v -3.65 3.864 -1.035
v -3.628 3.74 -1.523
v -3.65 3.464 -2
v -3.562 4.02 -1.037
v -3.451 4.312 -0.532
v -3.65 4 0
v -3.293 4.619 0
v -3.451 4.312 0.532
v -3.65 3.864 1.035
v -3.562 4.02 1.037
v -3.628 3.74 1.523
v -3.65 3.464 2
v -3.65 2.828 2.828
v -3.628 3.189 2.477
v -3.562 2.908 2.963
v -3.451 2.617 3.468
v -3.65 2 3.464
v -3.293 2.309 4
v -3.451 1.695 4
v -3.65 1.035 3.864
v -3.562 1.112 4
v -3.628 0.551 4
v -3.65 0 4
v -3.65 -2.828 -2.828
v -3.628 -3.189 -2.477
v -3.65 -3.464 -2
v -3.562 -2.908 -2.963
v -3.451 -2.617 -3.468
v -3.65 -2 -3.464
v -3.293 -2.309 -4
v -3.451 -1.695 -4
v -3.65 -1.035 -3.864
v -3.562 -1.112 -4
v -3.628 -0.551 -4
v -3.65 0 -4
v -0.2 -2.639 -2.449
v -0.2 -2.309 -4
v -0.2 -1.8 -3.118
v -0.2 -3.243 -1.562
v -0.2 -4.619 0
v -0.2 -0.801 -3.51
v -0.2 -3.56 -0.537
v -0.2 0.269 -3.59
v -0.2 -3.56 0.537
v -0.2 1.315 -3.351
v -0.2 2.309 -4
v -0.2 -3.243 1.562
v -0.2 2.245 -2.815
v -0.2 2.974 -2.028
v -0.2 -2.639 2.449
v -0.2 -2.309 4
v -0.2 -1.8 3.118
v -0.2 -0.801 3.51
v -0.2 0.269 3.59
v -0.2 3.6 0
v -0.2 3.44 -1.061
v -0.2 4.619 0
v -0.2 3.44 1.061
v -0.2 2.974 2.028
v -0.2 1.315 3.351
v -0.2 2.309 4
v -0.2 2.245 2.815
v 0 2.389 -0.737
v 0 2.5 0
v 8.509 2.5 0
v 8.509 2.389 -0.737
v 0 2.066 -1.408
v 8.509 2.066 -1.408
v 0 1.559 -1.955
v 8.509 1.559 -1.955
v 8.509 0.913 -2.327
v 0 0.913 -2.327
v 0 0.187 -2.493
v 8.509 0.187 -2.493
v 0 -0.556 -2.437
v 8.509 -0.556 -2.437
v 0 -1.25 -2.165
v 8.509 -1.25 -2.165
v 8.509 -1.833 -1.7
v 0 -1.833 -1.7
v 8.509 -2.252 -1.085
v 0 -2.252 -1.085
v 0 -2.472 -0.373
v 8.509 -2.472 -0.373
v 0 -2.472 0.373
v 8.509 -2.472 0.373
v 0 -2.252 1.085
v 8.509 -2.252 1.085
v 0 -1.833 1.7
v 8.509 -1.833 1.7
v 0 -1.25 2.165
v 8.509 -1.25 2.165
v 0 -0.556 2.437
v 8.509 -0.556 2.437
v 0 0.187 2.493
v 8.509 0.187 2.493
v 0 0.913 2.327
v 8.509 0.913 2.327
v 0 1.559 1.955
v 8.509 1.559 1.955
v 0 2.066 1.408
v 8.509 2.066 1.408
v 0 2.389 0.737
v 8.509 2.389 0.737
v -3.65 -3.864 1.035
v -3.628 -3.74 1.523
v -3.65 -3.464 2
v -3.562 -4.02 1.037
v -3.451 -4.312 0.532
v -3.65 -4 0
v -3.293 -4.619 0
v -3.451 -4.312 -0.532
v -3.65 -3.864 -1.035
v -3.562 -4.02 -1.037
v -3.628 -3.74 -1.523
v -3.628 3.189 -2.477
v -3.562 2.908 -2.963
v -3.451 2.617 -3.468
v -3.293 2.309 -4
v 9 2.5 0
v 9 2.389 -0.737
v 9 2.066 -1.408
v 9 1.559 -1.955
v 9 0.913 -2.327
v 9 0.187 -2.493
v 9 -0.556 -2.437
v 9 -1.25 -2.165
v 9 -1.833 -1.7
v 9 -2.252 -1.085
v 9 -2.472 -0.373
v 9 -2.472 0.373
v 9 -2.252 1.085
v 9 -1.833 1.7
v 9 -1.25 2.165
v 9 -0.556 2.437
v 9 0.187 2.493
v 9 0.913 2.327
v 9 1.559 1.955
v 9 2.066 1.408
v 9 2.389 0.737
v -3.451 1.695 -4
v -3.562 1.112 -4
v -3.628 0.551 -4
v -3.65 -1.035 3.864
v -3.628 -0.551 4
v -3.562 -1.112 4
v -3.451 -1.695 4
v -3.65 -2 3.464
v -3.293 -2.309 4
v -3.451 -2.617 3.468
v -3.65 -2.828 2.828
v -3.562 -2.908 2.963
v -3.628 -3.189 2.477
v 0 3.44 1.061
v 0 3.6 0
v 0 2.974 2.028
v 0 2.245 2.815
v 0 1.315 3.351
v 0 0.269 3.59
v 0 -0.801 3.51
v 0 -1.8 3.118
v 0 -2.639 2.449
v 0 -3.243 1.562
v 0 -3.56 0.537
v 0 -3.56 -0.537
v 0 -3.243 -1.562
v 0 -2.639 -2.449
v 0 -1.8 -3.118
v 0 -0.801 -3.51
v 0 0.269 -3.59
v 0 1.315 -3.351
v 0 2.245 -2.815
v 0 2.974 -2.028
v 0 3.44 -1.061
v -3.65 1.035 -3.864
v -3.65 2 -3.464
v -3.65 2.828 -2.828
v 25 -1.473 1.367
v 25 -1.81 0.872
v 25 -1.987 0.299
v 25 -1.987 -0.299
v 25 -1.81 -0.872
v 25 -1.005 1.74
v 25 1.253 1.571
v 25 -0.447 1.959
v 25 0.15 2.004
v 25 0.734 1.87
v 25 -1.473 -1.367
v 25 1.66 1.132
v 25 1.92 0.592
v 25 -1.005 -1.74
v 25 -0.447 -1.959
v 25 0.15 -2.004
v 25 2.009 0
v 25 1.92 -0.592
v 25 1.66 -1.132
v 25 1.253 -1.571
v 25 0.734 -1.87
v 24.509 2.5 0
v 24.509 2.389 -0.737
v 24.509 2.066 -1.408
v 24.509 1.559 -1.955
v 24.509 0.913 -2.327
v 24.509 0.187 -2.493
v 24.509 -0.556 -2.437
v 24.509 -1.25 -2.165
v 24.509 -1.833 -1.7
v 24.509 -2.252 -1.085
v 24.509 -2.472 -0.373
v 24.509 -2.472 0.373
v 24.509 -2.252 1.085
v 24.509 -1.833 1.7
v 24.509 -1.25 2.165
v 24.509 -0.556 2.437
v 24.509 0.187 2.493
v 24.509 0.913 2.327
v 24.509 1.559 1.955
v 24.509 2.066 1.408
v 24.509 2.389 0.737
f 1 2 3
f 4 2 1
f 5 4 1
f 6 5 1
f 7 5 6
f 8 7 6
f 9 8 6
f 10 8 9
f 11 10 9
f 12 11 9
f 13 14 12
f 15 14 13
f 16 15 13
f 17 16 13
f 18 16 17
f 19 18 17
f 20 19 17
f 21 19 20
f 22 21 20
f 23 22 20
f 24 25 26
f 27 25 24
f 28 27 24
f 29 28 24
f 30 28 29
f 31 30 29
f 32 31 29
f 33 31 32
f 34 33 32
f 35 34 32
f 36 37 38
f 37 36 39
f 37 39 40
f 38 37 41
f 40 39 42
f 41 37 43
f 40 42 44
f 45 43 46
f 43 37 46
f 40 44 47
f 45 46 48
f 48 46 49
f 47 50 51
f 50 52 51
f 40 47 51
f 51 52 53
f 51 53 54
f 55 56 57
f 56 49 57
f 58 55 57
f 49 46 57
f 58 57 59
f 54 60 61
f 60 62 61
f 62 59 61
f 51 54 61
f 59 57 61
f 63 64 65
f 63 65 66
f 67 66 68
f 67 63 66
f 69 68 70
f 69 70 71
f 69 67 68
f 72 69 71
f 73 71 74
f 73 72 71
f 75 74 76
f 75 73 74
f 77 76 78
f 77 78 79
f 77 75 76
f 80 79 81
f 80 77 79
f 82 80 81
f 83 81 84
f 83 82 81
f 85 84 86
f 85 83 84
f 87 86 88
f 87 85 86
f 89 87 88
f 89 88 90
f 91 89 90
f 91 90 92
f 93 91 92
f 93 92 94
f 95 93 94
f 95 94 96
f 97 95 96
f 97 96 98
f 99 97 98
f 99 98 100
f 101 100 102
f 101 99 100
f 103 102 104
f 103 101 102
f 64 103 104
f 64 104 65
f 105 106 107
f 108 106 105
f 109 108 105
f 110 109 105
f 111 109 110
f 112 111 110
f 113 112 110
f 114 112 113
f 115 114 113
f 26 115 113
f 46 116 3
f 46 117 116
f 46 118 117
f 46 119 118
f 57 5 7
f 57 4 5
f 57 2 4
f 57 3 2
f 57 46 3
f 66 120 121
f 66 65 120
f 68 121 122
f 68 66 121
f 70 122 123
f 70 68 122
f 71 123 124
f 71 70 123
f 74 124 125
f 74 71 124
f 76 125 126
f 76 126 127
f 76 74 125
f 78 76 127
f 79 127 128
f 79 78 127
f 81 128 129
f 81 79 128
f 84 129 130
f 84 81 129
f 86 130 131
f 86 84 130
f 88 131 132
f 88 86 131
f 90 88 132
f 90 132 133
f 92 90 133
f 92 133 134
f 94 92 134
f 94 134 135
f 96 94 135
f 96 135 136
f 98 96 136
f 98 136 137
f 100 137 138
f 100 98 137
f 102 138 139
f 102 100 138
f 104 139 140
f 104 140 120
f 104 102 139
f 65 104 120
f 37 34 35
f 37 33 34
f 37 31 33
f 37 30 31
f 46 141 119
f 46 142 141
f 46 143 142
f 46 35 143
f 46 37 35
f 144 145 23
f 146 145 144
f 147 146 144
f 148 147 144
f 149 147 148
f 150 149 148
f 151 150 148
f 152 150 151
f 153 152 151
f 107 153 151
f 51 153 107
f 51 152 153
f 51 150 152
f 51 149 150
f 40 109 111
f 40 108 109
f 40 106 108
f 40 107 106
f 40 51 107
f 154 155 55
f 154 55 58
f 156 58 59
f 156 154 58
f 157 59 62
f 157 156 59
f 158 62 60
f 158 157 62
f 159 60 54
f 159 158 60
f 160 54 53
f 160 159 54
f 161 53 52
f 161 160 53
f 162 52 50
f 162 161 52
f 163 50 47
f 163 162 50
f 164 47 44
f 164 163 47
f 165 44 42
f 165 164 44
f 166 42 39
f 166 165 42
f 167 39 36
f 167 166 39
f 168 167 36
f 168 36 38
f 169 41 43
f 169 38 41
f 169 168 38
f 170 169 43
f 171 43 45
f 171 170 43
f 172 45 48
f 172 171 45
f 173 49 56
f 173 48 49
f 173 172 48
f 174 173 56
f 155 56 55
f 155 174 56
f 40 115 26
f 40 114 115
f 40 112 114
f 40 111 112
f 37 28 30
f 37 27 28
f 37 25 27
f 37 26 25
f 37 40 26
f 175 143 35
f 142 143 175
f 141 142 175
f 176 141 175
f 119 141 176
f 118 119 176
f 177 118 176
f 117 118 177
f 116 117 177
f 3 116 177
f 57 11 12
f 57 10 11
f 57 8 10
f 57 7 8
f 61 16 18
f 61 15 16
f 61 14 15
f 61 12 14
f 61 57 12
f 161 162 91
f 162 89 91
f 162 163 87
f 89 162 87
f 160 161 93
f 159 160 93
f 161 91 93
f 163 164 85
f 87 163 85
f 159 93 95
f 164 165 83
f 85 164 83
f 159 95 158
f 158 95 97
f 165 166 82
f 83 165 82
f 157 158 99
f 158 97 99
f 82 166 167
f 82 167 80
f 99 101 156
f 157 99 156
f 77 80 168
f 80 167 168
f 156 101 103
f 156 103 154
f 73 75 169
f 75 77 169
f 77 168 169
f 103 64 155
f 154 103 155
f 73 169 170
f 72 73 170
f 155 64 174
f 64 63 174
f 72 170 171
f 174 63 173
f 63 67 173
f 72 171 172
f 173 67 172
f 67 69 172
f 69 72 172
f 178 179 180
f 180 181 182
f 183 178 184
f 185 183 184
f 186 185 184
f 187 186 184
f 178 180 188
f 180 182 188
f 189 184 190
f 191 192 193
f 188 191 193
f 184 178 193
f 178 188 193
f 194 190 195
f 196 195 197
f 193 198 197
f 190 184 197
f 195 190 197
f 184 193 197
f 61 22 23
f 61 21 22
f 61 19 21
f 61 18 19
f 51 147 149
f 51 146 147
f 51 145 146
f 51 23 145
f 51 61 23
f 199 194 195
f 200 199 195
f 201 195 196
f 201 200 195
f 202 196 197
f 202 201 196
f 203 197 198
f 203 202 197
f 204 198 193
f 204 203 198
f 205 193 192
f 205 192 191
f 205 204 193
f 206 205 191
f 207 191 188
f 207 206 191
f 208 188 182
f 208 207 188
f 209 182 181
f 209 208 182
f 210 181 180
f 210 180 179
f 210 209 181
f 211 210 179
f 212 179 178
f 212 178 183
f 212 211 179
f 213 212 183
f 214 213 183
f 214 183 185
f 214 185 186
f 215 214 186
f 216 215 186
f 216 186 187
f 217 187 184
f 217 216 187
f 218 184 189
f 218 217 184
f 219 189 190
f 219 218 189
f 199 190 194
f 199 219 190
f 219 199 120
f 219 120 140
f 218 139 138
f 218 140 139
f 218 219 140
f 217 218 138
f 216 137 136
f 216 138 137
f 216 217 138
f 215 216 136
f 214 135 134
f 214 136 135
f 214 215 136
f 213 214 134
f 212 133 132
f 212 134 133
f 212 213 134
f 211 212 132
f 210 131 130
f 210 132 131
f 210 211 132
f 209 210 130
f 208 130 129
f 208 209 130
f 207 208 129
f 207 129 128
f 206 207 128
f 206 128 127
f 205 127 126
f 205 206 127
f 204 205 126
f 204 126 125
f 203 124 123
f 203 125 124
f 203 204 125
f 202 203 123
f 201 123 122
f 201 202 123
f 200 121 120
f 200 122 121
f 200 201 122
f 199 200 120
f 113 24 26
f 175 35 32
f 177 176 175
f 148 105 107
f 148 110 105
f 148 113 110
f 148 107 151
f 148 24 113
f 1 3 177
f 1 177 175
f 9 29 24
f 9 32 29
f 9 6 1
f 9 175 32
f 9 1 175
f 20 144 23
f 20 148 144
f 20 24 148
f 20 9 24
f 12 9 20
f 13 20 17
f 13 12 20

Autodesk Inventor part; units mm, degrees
ref_plane "YZ Plane" through (0, 0, 0) normal (1, 0, 0) x (0, 1, 0)
ref_plane "XZ Plane" through (0, 0, 0) normal (0, 1, 0) x (-1, 0, 0)
sketch "Szkic1" plane through (0, 0, 0) normal (0, 0, 1) x (1, 0, 0)
  line L0 (0, 3.6) -> (0, 2.5)
  line L1 (9, 2.5) -> (25, 2.5)
  line L2 (25, 2.5) -> (25, 0)
  line L3 (25, 0) -> (-0.2001, 0)
  line L4 (-5.2401, 0) -> (30.04, 0) projected
  line L5 (-0.2001, 0) -> (-0.2001, 3.6)
  line L6 (-0.2001, 3.6) -> (0, 3.6)
  line L7 (9, 2.5) -> (8.5091, 2.5)
  line L8 (8.5091, 2.5) -> (0, 2.5)
  line L9 (0, -0.72) -> (0, 4.32) projected
  dimension "d0" = 25
  dimension "d1" = 16
  dimension "d2" = 5
  dimension "d9" = 0.2001
  dimension "d10" = 7.2
  dimension "d13" = 0.4909
  dimension "d14" = 5
revolve "Bryła" add sketch "Szkic1" angle 360 about axis through (25, 0, 0) along (-1, 0, 0)
sketch "Szkic2" plane through (-0.2001, 0, 0) normal (-1, 0, 0) x (0, 0, 1)
  line L0 (0, 4.6188) -> (4, 2.3094)
  line L1 (4, 2.3094) -> (4, -2.3094)
  line L2 (4, -2.3094) -> (0, -4.6188)
  line L3 (0, -4.6188) -> (-4, -2.3094)
  line L4 (-4, -2.3094) -> (-4, 2.3094)
  line L5 (-4, 2.3094) -> (0, 4.6188)
  point P0 (0, 0)
  point P1 (0, 0)
  dimension "d11" = 8
extrude "Głowica" add sketch "Szkic2" along normal blind 3.45
sketch "Szkic4" plane through (0, 0, 0) normal (0, 0, 1) x (1, 0, 0)
  line L0 (-3.6501, 4) -> (-3.6501, 4.6188)
  line L1 (-3.6501, 4.6188) -> (-3.2928, 4.6188)
  line L2 (-3.2928, 4.6188) -> (-3.6501, 4)
  line L3 (-4.3401, 0) -> (0.4899, 0) projected
  line L4 (-0.2001, 4.6188) -> (-3.6501, 4.6188) projected
  line L5 (-3.6501, 2.3094) -> (-3.6501, 4.6188) projected
  dimension "d5" = 30
  dimension "d19" = 8
revolve "Faza1" cut sketch "Szkic4" angle 360 about axis through (-10, 0, 0) along (1, 0, 0)
thread "Gwint" size "M5x0.8" class "6g" standard "ISO Metric profile" length 16
chamfer "Faza2" distance 0.4908 distance2 0.4909 1 edges at (25, -2.5, 0) measured on face at (25, 0.7379, -0.3873)
ref_plane "Work Plane1" through (1.525, 0, 0) normal (0, 0, 1) x (1, 0, 0)
equation "\"d0\" = NLG"
equation "\"d1\" = GEL"
equation "\"d2\" = GD"
equation "\"d10\" = SD2"
equation "\"d14\" = BDM"
equation "\"d11\" = SW"
equation "\"d3\" = KOH - SD"
equation "\"d5\" = ANG1"
equation "\"d19\" = SW0"
equation "\"d15\" = GEL"
equation "\"d6\" = -0.5 * SPD + 0.5 * GD"
equation "\"NLG\" = 25"
equation "\"GD\" = NND"
equation "\"BDM\" = NND"
equation "\"KOH\" = 3.65"
equation "\"GEL\" = 16"
equation "\"SW\" = 8"
equation "\"SW0\" = 8"
equation "\"SPD\" = NND - 1.2269 * PTC"
equation "\"SD2\" = 0.9 * SW"
equation "\"SD\" = 0.2"
equation "\"ANG1\" = 30deg"
equation "\"GAL\" = 0.61345 * PTC"
equation "\"GUL\" = 0.61345 * PTC"
equation "\"RR\" = 0.35"
equation "\"GD1\" = THREADDIA - 1.2269 * PTC"
equation "\"THREADDIA\" = 5"
equation "\"SDH\" = 7.55"
equation "\"TOA\" = 30deg"
equation "\"PTC\" = 0.8"
equation "\"NND\" = 5"
equation "\"E0\" = 1.155 * SW"
properties part number "BS 3692 - M5 x 25" material "Stal, miękka"
